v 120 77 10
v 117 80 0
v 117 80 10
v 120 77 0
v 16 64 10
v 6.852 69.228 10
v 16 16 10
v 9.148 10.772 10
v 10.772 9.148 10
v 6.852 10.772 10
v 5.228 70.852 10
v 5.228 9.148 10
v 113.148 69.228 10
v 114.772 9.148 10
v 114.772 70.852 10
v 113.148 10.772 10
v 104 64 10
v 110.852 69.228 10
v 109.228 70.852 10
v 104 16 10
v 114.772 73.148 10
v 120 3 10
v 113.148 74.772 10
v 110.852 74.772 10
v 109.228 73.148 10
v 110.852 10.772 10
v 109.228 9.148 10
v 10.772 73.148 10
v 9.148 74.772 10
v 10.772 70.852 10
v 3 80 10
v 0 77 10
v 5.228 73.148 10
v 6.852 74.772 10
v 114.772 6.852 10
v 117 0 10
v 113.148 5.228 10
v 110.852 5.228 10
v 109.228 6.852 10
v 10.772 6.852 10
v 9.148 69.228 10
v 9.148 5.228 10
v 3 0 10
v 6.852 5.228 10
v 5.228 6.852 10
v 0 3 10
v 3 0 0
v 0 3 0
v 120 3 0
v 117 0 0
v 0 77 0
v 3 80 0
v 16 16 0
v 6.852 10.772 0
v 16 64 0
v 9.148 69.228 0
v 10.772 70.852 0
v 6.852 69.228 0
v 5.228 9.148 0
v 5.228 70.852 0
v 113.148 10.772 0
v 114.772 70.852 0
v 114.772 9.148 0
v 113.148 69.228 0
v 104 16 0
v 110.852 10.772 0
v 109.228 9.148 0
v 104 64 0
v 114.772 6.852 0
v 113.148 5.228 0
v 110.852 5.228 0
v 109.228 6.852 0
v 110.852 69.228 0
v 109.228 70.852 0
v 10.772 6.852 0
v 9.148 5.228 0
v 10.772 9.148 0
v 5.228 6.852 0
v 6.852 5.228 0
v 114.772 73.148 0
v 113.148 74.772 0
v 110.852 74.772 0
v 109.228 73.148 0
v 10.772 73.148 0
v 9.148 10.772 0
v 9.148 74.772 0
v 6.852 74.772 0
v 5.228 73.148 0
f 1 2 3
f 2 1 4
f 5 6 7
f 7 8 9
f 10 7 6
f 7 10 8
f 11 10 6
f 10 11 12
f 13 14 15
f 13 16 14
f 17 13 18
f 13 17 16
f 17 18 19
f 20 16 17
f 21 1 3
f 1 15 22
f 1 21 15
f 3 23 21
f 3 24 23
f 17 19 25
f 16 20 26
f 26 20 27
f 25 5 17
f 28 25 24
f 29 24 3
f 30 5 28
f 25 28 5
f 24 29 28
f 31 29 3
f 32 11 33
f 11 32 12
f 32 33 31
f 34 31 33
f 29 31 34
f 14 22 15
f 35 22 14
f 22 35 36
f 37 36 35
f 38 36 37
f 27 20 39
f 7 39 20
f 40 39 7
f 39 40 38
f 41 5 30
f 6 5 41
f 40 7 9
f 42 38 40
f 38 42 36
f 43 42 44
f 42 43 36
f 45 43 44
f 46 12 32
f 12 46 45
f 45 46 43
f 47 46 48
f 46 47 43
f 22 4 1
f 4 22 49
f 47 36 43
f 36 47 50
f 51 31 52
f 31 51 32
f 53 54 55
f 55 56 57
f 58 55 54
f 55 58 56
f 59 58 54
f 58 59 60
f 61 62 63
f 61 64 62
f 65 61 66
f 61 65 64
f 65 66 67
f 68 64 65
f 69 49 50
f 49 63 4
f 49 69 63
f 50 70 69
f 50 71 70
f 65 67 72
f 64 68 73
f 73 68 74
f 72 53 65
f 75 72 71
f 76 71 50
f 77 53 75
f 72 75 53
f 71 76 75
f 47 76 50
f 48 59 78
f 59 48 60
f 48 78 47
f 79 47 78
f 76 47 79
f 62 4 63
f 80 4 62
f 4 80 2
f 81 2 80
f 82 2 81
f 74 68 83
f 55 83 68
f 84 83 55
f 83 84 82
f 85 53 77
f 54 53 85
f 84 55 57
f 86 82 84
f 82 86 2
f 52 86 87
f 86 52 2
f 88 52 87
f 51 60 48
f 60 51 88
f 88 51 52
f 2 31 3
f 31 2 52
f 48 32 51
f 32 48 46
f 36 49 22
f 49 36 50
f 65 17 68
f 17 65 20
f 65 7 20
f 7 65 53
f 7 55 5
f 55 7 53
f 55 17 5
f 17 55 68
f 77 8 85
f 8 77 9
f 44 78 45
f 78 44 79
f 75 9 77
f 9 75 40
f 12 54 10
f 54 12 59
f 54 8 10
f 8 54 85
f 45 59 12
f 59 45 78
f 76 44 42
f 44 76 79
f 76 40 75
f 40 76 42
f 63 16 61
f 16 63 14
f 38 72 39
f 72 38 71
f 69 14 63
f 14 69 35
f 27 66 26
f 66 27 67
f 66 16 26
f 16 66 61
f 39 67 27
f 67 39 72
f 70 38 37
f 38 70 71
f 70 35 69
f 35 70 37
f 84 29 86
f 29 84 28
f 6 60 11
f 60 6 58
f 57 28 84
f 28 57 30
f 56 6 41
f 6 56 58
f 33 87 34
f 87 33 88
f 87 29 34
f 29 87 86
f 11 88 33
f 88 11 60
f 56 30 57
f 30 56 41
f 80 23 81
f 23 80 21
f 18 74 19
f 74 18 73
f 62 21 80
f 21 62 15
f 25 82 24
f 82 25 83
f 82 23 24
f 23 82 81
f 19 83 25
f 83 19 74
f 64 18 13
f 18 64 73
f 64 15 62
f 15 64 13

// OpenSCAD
$fn = 32;

// ----------------------------------------------------------------------
// Frame plate: 120 x 80 frame, 16 mm rails
// ----------------------------------------------------------------------

// --- parameters (mm) ---
plate_l = 120;            // plate length, X
plate_w = 80;             // plate width, Y
plate_t = 10;             // plate thickness, Z (extrusion height)
corner_c = 3;             // corner chamfer
frame_bar = 16;           // frame rail width
bolt_r = 3;               // corner bolt window radius
bolt_inset = 8;           // bolt centre inset from the edges

win_l = plate_l - 2 * frame_bar;  // window length
win_w = plate_w - 2 * frame_bar;  // window width
bolt_d = 2 * bolt_r;  // corner hole diameter

profile = [[3, 0], [117, 0], [120, 3], [120, 77], [117, 80], [3, 80], [0, 77], [0, 3]];  // primary outline, 8 points, counter clockwise
void_1 = [[16, 16], [104, 16], [104, 64], [16, 64]];  // the window, 4 points
void_2 = [[10.772, 9.148], [9.148, 10.772], [6.852, 10.772], [5.228, 9.148], [5.228, 6.852], [6.852, 5.228], [9.148, 5.228], [10.772, 6.852]];  // corner bolt window, 8 points
void_3 = [[114.772, 9.148], [113.148, 10.772], [110.852, 10.772], [109.228, 9.148], [109.228, 6.852], [110.852, 5.228], [113.148, 5.228], [114.772, 6.852]];  // corner bolt window, 8 points
void_4 = [[10.772, 73.148], [9.148, 74.772], [6.852, 74.772], [5.228, 73.148], [5.228, 70.852], [6.852, 69.228], [9.148, 69.228], [10.772, 70.852]];  // corner bolt window, 8 points
void_5 = [[114.772, 73.148], [113.148, 74.772], [110.852, 74.772], [109.228, 73.148], [109.228, 70.852], [110.852, 69.228], [113.148, 69.228], [114.772, 70.852]];  // corner bolt window, 8 points

// --- the one profile operation ---
difference() {
  linear_extrude(height = plate_t) polygon(points = profile);
  translate([0, 0, -1])
    linear_extrude(height = plate_t + 2) polygon(points = void_1);
  translate([0, 0, -1])
    linear_extrude(height = plate_t + 2) polygon(points = void_2);
  translate([0, 0, -1])
    linear_extrude(height = plate_t + 2) polygon(points = void_3);
  translate([0, 0, -1])
    linear_extrude(height = plate_t + 2) polygon(points = void_4);
  translate([0, 0, -1])
    linear_extrude(height = plate_t + 2) polygon(points = void_5);
}
